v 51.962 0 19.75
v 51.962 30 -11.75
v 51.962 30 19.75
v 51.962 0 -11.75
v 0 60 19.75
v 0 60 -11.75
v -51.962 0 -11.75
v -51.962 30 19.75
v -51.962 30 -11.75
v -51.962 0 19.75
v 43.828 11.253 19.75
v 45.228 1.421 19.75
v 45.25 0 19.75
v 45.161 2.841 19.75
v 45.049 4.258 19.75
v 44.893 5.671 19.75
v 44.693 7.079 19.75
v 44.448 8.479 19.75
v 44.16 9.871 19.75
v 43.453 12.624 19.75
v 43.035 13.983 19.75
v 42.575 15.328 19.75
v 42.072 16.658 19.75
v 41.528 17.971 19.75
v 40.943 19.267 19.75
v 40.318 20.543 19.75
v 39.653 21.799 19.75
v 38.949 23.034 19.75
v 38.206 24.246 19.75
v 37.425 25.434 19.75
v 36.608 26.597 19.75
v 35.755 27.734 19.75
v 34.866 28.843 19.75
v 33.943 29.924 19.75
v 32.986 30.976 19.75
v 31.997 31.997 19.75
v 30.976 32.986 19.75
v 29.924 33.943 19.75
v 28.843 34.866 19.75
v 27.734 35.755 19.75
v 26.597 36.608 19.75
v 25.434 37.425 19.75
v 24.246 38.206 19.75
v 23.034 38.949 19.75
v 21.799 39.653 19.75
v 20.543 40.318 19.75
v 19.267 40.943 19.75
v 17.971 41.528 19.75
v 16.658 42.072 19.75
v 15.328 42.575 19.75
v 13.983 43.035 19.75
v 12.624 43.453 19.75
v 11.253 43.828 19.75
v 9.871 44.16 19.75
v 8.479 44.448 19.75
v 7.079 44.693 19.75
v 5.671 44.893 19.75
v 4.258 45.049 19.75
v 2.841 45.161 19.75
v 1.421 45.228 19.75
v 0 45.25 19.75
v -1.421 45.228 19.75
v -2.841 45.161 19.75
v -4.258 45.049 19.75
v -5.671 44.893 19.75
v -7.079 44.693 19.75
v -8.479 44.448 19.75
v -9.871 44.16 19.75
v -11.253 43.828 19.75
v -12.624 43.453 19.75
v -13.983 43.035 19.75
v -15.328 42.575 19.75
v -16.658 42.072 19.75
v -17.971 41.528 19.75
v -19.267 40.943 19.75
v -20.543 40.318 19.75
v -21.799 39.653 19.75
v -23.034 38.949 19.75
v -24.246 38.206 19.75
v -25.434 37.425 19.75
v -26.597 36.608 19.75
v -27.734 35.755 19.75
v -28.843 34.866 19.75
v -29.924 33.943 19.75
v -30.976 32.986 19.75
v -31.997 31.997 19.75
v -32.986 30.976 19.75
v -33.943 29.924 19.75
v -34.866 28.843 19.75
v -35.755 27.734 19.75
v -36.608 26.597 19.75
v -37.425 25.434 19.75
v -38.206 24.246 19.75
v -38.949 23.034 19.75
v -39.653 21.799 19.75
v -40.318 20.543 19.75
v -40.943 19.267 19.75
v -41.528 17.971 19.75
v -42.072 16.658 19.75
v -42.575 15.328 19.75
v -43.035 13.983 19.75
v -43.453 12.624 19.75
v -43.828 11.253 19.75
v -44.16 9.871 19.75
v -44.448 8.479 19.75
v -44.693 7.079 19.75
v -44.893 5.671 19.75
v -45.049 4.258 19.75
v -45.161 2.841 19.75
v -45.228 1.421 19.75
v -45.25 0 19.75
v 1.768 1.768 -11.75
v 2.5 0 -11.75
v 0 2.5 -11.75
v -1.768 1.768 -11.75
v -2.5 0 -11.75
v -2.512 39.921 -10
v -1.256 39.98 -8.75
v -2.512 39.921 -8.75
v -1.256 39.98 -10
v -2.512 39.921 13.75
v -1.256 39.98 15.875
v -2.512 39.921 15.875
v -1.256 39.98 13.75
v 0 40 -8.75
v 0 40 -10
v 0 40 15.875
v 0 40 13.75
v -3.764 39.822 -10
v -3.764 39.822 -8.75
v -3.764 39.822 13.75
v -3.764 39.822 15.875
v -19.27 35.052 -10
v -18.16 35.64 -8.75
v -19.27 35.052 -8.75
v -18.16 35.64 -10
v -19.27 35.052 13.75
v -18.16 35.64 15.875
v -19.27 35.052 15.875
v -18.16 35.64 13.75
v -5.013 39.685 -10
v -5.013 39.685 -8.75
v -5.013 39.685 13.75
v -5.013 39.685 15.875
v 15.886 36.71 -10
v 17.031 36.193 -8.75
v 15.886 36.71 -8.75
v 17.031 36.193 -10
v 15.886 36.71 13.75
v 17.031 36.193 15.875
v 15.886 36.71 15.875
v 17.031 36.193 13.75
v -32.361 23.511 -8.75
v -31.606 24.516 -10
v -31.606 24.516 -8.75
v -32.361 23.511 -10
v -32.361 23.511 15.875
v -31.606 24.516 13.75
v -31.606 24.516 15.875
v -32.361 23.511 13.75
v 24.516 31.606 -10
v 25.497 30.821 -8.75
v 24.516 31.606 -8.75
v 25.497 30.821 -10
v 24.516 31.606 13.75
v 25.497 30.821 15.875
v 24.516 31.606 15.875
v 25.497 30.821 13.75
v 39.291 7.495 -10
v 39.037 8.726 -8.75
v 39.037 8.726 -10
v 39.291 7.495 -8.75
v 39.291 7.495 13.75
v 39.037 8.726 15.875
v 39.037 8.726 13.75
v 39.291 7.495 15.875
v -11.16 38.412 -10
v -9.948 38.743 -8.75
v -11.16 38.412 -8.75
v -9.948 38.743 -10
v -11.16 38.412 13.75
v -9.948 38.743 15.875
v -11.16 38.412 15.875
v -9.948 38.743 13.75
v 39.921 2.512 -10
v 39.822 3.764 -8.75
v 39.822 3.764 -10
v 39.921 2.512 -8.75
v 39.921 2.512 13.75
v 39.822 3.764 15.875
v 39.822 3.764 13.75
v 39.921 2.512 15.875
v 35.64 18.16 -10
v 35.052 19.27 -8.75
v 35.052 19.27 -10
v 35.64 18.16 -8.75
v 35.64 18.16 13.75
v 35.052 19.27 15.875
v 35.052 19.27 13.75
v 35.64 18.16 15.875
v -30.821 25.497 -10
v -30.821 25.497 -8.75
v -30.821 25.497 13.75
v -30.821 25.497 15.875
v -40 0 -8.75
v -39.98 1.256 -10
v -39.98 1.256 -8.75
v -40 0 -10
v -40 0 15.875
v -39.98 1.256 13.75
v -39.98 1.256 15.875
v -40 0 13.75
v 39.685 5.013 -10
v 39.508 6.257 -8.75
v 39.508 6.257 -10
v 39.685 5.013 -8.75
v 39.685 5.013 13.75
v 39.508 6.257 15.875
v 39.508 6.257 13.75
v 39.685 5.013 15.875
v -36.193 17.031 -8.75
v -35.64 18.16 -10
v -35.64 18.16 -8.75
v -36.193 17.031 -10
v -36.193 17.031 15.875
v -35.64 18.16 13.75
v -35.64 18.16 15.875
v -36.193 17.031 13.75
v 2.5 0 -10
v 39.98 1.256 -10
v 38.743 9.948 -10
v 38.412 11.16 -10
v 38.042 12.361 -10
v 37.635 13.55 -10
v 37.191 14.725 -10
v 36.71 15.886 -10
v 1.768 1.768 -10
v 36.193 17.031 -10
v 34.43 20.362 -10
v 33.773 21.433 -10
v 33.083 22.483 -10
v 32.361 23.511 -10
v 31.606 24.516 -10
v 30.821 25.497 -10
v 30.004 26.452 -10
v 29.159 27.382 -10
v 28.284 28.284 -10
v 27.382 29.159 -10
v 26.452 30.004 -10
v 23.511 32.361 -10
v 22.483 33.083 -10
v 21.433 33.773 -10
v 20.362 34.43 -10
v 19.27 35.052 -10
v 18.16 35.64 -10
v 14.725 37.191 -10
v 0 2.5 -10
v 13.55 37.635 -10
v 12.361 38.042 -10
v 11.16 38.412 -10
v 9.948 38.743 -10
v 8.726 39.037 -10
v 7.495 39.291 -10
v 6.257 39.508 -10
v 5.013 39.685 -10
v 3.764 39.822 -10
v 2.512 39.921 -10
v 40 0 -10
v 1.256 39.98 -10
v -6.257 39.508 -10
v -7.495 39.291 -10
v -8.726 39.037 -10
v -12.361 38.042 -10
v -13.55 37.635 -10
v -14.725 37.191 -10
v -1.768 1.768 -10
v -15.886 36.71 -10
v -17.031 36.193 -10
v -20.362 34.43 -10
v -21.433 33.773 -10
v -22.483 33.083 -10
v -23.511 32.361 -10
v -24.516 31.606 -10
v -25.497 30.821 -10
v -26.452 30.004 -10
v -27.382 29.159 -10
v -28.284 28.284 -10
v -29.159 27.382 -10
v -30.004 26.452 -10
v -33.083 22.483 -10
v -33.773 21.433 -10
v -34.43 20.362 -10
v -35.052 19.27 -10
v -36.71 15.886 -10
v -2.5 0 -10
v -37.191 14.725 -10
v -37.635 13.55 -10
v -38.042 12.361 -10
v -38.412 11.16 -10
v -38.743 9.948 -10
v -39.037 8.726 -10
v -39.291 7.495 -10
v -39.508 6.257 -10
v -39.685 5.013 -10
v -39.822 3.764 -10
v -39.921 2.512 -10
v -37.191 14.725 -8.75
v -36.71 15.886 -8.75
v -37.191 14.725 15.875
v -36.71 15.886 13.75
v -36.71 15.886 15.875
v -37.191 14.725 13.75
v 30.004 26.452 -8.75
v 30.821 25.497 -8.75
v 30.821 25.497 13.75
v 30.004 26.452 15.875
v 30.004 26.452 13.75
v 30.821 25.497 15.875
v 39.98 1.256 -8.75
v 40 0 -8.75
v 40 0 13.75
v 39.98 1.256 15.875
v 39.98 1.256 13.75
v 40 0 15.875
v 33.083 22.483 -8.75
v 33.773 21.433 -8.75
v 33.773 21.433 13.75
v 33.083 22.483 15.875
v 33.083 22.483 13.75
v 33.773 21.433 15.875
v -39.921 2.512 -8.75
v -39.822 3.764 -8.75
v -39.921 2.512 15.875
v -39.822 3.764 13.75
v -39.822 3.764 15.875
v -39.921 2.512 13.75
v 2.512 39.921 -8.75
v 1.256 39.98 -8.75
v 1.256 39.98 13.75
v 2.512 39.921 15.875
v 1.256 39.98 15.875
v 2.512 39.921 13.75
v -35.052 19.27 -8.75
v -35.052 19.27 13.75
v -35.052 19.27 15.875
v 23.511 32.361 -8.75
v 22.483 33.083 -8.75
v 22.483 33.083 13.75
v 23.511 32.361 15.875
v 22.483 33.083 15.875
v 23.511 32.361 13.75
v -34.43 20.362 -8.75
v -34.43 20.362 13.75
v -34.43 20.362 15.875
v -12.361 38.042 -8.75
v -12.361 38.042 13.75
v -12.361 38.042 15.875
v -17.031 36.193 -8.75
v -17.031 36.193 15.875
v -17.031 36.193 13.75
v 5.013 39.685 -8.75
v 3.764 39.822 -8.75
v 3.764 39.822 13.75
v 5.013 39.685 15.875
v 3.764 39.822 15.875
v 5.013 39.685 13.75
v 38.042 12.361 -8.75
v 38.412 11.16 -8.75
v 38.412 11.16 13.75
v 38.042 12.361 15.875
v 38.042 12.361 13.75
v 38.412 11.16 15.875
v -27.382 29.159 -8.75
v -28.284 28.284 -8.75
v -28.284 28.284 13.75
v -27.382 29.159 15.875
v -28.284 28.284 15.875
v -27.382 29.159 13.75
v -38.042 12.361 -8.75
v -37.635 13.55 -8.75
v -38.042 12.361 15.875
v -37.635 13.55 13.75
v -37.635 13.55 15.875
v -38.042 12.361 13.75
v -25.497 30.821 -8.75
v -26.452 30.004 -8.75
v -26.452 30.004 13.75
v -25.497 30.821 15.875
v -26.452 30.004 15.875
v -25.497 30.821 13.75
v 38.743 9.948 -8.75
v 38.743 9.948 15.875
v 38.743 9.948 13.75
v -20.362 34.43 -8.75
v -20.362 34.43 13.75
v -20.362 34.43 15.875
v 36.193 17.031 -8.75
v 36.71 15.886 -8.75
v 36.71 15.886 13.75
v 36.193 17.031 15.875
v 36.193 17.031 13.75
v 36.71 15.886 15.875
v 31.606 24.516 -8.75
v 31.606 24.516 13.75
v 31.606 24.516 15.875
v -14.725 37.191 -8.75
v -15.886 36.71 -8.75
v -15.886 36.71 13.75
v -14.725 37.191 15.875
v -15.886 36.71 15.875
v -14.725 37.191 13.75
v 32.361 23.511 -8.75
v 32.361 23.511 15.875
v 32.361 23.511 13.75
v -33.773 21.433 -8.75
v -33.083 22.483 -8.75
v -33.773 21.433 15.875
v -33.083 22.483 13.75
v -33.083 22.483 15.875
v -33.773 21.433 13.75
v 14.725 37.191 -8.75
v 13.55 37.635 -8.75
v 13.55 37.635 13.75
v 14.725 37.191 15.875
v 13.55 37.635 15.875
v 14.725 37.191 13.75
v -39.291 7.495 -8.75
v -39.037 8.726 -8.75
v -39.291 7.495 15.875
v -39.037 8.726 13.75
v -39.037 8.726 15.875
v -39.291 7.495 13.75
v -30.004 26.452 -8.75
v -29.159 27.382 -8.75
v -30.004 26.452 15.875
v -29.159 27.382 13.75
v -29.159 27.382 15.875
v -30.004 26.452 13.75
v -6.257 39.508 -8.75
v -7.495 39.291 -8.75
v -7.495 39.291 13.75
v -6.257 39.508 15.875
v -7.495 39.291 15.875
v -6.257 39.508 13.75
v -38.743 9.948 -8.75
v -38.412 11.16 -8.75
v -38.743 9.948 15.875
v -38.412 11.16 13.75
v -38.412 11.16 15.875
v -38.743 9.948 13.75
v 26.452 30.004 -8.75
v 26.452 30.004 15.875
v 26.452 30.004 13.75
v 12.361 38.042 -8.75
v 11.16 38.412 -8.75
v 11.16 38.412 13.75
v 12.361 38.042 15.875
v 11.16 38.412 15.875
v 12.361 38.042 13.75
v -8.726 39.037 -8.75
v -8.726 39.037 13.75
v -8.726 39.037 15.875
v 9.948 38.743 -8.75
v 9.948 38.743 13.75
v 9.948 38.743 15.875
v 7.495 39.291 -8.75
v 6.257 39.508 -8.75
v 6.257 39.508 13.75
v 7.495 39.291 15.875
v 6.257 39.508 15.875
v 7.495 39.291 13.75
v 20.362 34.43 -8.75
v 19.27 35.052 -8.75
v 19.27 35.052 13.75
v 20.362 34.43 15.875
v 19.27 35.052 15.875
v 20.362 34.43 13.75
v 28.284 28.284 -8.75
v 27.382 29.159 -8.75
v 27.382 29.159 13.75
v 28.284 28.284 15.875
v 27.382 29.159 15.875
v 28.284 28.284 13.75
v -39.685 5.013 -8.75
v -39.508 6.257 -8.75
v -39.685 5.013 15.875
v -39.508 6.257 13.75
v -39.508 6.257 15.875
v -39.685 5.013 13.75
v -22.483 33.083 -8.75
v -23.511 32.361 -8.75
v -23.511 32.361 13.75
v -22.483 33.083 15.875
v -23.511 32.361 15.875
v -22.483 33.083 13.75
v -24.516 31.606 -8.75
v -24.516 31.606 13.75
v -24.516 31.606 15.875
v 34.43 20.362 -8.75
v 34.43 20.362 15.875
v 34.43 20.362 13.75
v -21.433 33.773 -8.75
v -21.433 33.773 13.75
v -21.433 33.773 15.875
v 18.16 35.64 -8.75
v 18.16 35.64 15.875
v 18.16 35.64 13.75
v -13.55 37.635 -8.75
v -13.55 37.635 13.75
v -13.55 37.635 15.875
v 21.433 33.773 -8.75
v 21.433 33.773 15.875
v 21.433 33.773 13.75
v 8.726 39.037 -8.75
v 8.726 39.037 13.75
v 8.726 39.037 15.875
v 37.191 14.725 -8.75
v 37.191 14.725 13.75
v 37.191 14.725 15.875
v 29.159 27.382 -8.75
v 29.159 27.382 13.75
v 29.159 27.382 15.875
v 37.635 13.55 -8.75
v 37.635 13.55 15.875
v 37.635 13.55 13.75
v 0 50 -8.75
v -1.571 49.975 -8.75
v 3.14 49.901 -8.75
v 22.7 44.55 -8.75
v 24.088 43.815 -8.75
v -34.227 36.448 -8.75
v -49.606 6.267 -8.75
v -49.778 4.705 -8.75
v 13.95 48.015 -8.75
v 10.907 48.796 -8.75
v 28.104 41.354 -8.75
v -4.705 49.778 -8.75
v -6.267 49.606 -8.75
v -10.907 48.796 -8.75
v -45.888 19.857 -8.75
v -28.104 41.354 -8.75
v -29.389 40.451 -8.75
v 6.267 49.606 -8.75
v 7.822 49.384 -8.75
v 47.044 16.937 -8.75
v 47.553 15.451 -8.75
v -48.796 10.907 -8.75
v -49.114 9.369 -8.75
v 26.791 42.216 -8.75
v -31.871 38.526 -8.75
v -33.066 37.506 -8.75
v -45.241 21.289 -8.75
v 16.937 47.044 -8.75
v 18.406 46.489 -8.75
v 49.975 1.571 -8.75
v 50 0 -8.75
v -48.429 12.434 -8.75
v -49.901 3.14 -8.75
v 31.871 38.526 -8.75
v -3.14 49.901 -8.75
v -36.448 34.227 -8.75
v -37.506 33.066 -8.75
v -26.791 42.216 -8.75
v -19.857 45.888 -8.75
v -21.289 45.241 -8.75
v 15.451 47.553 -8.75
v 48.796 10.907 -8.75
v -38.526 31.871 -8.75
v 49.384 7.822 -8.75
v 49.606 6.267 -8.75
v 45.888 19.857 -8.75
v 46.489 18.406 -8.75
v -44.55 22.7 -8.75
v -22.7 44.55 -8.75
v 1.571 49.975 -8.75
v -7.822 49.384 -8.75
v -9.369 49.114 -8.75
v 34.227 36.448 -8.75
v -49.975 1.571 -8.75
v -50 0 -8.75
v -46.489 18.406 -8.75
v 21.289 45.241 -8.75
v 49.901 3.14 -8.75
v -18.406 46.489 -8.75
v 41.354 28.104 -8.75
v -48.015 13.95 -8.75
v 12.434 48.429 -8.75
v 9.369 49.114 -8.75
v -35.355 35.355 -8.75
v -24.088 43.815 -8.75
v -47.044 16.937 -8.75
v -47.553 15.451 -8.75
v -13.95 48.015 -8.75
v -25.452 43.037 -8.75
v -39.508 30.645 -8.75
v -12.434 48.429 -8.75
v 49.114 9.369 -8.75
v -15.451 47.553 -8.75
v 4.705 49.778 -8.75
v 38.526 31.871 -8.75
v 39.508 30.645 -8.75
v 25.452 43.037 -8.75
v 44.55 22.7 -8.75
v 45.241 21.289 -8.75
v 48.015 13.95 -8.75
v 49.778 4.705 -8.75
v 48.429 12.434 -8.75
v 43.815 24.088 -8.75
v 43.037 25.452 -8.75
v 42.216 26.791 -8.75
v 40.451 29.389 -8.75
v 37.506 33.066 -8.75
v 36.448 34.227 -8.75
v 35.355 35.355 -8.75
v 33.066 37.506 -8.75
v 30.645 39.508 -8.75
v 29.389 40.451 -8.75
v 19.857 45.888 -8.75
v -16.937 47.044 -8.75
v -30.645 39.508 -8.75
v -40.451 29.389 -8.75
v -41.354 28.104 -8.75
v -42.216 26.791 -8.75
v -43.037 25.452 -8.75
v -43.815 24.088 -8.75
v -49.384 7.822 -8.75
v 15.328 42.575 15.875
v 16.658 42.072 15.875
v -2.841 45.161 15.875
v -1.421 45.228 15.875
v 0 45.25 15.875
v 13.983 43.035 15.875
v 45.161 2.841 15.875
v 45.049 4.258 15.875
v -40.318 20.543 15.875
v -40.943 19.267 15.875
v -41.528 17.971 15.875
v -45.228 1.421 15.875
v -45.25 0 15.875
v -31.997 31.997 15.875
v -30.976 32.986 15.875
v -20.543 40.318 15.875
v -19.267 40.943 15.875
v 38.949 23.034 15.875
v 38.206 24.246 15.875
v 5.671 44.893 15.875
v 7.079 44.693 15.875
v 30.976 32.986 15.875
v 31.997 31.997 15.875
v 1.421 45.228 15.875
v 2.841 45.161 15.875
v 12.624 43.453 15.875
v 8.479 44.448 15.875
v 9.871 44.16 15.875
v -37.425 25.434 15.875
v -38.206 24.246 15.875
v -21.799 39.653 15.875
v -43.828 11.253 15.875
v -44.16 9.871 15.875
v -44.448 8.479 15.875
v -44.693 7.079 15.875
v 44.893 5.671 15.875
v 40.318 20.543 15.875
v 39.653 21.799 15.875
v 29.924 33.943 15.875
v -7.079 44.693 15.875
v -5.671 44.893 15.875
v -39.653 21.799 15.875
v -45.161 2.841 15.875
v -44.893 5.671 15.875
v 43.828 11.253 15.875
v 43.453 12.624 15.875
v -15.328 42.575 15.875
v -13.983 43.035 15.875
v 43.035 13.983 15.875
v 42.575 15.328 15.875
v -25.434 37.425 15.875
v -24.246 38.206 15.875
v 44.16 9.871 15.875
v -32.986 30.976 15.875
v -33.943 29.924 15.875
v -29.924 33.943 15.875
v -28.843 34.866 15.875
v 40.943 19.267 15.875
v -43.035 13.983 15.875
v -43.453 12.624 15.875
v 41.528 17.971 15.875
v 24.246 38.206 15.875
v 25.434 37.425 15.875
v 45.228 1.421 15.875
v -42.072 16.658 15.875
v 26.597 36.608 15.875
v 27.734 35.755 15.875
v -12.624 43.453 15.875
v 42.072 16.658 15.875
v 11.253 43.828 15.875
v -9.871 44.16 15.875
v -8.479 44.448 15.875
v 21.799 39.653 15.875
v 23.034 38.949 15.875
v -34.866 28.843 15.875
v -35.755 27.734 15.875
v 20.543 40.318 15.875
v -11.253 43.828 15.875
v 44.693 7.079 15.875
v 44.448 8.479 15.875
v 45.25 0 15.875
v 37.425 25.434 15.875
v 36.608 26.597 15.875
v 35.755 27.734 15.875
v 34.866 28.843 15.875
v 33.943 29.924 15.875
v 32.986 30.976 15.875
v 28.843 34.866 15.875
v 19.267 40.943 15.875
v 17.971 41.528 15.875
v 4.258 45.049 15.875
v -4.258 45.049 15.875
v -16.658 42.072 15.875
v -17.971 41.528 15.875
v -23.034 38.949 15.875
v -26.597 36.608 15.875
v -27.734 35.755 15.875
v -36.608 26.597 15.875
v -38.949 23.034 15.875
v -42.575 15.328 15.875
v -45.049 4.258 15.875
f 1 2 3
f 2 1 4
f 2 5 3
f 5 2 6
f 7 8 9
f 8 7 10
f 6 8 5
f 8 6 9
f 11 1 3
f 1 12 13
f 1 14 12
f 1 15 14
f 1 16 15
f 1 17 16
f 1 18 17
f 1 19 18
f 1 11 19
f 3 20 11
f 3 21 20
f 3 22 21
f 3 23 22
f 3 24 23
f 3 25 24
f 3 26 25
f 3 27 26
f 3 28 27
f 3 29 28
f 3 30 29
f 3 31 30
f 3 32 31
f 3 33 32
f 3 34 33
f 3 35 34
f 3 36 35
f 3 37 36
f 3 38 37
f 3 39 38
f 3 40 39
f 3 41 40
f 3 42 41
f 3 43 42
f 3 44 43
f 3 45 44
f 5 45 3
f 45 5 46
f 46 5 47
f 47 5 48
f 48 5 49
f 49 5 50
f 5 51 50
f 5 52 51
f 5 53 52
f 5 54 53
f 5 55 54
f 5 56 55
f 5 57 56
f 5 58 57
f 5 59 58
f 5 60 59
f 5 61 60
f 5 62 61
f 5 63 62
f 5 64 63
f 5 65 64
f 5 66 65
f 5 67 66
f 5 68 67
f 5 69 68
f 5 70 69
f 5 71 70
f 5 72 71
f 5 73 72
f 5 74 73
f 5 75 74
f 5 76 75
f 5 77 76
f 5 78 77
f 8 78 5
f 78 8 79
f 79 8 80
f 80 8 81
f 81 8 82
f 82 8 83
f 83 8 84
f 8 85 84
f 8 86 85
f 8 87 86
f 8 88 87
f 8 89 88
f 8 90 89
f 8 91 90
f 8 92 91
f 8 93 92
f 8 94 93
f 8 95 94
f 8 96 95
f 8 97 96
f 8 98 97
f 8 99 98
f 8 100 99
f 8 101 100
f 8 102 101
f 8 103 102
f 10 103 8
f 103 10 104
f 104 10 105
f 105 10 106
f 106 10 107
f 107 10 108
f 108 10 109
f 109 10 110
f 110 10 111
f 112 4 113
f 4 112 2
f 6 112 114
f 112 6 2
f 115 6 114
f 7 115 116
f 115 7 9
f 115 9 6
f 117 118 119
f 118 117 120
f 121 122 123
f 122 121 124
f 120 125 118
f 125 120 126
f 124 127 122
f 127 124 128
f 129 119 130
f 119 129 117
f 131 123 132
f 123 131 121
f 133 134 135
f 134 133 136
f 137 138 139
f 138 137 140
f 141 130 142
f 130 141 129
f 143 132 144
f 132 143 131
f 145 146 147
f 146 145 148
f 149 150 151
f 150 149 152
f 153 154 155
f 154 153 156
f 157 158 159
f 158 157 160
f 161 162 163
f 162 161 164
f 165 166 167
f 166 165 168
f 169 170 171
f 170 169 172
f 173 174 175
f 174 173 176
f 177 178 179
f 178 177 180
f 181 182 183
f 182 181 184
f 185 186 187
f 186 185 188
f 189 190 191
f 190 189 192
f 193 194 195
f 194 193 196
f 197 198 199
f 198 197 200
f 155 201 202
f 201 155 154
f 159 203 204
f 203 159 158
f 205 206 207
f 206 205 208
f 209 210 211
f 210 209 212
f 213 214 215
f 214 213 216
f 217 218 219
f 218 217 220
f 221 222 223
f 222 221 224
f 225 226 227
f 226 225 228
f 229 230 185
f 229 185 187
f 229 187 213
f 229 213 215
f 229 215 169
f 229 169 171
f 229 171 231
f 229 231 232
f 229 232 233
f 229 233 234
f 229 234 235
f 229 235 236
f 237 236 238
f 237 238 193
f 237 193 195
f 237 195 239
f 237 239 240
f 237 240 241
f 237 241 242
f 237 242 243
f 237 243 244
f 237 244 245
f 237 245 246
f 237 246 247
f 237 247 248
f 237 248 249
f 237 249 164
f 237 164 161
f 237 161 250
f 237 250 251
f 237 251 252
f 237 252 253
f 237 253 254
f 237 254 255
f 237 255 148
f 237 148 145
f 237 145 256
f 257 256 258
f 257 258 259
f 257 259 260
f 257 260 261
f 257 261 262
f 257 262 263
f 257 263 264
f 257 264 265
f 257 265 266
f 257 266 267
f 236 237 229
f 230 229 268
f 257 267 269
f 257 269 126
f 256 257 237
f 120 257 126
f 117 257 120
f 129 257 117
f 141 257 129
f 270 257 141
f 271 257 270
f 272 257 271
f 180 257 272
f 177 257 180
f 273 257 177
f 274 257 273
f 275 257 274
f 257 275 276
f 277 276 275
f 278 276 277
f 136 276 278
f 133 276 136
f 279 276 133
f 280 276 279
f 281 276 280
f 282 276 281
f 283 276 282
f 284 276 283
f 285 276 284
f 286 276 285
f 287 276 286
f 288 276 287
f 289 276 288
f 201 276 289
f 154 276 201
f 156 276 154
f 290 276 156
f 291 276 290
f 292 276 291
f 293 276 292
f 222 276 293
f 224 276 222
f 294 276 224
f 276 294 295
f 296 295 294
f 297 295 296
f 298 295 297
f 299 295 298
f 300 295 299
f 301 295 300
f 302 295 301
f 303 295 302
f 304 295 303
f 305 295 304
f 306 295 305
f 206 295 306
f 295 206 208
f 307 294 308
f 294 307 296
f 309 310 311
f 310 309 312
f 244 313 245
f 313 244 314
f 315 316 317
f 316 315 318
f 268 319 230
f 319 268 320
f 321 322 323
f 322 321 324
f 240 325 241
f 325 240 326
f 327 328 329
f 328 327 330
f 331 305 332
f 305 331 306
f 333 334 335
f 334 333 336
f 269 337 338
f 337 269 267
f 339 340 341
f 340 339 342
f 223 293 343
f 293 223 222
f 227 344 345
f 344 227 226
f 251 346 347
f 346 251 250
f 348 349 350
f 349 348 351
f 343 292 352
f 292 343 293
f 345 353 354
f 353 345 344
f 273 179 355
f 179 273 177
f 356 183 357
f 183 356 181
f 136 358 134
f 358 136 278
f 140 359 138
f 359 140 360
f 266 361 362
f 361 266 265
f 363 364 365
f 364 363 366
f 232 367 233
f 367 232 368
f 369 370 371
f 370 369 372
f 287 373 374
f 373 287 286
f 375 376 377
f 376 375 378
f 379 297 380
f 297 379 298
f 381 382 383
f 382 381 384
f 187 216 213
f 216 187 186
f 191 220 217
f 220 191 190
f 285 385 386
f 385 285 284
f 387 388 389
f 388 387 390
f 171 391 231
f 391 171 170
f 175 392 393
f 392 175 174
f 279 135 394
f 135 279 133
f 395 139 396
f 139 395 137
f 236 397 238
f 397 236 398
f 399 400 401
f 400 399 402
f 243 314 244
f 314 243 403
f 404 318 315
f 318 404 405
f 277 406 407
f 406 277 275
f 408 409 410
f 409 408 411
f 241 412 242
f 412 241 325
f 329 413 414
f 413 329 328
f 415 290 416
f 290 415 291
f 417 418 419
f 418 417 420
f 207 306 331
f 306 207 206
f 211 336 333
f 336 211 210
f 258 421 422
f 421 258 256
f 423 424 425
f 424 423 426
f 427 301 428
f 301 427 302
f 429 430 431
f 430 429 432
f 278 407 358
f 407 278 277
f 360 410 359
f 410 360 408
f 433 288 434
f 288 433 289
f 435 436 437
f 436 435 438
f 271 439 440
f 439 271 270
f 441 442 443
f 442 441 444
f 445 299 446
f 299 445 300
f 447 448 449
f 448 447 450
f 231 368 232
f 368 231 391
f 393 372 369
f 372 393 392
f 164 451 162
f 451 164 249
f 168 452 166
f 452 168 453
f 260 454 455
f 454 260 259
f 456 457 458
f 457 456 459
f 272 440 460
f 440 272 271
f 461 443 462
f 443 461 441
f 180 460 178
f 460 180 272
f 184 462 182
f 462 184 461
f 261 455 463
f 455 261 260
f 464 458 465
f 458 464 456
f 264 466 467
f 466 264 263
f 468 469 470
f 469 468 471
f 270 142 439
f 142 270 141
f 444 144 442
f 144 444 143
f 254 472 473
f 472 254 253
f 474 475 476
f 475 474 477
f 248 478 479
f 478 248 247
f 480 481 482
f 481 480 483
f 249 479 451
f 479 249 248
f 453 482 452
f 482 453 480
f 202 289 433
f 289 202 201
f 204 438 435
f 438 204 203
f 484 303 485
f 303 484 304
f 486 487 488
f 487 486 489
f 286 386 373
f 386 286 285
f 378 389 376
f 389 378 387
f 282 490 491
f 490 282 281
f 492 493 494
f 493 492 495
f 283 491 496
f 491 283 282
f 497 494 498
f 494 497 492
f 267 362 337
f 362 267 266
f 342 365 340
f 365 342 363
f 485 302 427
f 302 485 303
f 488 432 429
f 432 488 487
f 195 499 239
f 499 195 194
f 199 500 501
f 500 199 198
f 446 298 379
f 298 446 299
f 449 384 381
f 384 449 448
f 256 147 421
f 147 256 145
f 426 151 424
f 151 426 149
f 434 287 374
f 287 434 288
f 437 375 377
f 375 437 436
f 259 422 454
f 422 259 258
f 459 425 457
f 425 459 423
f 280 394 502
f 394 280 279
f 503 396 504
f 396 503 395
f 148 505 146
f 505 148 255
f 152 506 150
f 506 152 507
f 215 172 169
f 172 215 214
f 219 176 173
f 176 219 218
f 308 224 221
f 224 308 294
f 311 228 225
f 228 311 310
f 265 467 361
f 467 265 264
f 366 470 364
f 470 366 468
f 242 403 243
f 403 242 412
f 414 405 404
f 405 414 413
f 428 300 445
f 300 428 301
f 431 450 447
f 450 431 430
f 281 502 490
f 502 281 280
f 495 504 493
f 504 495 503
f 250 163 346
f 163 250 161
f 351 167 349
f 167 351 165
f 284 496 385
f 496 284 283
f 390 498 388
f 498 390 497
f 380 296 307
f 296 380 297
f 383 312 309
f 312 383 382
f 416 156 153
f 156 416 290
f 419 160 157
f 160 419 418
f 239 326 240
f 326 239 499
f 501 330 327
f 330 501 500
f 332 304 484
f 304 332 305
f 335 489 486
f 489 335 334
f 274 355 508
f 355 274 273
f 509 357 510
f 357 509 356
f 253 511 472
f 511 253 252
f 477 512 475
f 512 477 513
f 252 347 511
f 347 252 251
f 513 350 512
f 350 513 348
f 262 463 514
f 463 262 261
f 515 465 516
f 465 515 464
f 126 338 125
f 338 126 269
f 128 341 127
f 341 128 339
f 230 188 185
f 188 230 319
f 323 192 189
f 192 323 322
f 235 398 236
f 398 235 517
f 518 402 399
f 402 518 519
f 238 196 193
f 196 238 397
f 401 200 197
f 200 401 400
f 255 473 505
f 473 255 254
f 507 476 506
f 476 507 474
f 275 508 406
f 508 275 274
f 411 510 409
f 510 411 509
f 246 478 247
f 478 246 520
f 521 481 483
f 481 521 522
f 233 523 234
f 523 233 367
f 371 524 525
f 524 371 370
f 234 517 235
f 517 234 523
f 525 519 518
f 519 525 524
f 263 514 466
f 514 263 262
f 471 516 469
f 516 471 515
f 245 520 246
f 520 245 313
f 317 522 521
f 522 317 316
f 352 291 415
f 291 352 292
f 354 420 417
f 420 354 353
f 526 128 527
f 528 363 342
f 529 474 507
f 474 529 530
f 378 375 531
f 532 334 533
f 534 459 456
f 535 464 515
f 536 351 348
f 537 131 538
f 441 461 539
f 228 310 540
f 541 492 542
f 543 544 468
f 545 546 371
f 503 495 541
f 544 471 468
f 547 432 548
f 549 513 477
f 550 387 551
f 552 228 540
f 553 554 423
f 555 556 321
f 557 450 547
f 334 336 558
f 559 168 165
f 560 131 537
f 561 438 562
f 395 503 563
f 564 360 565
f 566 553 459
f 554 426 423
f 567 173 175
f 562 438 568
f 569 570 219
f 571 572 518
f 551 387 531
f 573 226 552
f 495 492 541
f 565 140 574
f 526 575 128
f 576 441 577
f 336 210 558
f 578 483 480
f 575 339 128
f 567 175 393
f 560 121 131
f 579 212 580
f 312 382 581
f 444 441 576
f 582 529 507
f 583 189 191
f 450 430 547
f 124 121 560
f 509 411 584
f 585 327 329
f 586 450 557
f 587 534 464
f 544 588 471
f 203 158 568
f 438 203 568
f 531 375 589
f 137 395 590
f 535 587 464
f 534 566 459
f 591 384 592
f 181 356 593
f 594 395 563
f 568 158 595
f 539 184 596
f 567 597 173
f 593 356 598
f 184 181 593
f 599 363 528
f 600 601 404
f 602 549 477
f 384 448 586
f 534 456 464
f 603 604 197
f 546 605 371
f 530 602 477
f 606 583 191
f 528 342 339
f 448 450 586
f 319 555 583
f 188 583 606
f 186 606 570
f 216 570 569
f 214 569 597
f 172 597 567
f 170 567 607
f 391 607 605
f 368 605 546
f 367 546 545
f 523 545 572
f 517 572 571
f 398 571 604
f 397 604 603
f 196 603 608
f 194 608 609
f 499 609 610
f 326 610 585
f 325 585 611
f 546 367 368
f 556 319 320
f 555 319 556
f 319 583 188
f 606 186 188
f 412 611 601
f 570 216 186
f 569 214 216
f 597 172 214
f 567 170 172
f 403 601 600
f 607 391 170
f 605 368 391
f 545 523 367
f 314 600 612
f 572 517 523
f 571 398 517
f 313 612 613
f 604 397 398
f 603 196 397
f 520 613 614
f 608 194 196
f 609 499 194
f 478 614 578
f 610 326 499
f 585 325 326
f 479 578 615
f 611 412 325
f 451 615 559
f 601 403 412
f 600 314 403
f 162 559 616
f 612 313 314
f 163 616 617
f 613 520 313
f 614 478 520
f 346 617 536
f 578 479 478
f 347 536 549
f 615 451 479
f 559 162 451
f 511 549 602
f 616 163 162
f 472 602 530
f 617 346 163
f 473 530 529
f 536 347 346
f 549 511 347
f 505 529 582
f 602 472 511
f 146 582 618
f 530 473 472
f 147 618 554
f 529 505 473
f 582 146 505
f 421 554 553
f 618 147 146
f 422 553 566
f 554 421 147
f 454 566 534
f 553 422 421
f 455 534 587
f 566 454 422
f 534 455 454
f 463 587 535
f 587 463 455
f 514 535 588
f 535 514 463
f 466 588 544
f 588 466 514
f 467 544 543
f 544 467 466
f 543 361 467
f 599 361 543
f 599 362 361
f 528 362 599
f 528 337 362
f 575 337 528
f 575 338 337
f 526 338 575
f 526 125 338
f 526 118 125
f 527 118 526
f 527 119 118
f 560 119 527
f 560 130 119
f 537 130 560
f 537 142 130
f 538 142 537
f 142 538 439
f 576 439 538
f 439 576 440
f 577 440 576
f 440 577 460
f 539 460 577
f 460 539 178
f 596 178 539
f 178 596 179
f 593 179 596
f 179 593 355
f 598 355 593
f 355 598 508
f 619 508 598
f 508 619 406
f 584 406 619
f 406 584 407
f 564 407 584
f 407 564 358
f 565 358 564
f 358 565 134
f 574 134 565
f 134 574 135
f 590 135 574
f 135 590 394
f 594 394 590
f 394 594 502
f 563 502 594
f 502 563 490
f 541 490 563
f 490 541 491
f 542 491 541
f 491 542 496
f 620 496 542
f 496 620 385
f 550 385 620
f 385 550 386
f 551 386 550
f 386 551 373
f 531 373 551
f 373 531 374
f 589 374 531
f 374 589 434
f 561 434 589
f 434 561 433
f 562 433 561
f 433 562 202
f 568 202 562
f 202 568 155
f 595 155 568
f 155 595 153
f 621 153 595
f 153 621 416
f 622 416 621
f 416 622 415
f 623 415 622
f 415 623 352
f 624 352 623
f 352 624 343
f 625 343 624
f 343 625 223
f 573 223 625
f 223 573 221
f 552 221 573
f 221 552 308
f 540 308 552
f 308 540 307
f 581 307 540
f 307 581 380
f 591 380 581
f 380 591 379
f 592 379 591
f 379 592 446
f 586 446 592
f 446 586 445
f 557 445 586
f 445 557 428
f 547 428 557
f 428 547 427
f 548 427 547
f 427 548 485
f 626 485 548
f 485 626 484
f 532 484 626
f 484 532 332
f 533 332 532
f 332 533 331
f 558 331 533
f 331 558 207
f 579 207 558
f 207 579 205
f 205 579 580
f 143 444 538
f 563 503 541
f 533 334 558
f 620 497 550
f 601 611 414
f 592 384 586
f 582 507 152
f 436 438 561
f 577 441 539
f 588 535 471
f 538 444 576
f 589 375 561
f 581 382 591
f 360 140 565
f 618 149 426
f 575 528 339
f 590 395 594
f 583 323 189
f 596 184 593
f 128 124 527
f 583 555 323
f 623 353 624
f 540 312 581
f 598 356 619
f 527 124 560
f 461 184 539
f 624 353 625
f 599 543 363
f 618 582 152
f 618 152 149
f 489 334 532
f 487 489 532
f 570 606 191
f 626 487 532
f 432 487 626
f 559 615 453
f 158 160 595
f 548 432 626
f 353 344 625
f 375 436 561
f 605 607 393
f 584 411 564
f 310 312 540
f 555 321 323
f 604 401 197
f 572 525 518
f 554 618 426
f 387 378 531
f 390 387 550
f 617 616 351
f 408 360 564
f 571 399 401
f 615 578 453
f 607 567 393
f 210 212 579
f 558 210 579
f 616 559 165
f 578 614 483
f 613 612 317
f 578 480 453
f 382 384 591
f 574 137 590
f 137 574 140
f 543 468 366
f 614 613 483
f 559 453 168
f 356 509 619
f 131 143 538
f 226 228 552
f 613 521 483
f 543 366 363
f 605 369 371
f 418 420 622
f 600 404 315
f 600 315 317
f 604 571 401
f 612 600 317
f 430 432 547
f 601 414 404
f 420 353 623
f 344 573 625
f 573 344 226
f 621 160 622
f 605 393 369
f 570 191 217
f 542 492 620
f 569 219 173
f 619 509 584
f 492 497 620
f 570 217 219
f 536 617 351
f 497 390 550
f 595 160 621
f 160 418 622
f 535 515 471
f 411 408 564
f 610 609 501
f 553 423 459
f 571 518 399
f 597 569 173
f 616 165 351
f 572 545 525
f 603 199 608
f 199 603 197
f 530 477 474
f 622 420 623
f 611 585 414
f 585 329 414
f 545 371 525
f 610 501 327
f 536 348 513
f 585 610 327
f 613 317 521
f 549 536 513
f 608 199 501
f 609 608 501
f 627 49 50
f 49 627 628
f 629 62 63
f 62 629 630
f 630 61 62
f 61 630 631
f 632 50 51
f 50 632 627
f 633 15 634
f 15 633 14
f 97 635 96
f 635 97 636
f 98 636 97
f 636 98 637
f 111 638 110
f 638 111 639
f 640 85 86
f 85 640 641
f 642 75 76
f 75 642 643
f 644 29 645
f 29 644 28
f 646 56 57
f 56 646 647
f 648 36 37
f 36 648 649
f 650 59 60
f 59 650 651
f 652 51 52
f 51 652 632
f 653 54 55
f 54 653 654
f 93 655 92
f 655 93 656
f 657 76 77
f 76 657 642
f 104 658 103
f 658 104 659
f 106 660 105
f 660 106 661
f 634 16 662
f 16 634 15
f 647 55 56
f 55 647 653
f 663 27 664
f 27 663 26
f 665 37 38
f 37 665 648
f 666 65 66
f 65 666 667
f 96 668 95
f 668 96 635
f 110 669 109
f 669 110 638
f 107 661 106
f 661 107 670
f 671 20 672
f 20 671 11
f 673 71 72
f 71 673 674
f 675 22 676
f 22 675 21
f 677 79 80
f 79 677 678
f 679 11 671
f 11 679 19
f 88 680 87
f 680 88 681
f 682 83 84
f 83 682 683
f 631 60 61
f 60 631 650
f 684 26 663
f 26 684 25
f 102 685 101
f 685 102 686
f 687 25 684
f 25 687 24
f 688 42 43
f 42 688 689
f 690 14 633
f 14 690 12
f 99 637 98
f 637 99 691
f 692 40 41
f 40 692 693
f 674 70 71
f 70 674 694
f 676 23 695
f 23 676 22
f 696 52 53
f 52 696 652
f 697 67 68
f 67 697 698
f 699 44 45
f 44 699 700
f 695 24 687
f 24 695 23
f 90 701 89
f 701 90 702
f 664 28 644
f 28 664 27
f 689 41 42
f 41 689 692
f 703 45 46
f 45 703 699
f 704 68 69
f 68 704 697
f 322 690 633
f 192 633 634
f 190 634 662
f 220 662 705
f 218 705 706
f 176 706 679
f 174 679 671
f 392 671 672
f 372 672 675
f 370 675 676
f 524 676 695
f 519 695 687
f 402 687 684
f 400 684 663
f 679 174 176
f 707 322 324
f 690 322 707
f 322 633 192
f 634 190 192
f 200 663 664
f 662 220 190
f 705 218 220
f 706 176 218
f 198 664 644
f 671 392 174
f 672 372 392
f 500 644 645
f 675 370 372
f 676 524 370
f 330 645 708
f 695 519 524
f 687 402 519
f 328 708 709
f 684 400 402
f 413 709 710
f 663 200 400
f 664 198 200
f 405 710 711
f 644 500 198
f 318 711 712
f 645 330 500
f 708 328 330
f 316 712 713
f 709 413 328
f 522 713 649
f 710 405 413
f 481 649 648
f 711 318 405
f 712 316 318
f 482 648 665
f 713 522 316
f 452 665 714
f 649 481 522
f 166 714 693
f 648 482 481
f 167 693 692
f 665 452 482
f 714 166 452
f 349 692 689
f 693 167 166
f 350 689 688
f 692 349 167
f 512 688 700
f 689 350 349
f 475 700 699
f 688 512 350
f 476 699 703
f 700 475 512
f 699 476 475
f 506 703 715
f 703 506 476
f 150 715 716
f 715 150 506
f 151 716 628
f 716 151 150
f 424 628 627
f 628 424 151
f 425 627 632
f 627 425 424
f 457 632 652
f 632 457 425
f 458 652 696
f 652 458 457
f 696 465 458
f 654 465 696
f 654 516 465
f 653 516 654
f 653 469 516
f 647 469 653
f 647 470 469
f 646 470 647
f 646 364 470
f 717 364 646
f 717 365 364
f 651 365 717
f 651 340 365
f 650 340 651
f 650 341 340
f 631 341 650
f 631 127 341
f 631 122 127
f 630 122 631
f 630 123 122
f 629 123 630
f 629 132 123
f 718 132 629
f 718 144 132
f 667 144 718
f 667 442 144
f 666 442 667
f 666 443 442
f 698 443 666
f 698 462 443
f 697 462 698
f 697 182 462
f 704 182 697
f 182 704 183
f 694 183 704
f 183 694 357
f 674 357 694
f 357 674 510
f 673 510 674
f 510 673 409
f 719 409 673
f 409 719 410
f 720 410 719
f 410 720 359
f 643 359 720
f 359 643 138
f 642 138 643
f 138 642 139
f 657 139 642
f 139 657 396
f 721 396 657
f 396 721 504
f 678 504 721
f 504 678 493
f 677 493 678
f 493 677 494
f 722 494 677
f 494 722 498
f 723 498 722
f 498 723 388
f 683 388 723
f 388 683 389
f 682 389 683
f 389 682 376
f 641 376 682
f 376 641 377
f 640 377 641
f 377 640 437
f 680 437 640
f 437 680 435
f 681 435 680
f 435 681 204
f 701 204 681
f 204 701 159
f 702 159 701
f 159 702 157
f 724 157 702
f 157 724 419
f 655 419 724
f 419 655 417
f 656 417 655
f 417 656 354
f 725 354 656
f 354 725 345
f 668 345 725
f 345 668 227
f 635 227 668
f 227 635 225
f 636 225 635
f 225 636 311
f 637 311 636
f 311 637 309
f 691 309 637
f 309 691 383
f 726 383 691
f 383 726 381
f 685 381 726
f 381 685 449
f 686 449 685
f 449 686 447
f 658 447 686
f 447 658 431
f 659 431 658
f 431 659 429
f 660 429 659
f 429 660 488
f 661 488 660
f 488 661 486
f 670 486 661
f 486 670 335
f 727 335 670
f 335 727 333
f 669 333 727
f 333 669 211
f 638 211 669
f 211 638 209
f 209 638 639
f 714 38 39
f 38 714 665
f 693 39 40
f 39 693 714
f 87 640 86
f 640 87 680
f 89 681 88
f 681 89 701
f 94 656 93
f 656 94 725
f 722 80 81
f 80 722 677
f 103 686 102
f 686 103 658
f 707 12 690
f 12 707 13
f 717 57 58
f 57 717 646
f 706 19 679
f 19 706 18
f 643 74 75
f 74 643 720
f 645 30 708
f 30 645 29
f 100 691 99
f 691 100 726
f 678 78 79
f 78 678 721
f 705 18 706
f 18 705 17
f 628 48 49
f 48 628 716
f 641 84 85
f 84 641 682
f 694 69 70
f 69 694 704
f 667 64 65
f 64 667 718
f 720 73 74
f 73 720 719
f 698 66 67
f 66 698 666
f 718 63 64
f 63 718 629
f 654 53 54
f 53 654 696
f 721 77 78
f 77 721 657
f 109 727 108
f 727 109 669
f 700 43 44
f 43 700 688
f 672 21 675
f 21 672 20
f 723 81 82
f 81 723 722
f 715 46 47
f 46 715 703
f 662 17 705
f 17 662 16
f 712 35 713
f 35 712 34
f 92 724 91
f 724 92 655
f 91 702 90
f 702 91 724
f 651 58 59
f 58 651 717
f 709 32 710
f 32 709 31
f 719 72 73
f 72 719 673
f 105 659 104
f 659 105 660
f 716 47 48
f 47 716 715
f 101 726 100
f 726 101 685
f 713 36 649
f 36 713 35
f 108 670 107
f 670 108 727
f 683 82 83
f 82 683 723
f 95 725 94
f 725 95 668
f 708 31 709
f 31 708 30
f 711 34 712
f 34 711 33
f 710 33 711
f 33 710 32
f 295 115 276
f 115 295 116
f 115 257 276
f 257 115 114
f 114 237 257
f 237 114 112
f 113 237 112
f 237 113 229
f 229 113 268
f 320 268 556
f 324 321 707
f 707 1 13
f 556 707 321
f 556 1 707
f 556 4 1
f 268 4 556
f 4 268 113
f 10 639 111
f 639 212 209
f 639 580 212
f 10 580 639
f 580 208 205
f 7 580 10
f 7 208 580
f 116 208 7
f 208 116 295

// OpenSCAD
d=0.25;

r_screw=2.5;

wall=2.5;
acrylic=4;

h_tube=25;
r_out=60; 
r_in=40;
r_acrylic=45;

intersection(){
    rotate([0,0,90]) box();
    translate([-500,0,-500]) cube([1000, 1000,1000]);
}

module box(){
    difference(){
        translate([0, 0, acrylic]) cylinder(h=h_tube+acrylic+wall, r=r_out, center=true, $fn=6);
        
        translate([0,0,h_tube/2+wall]) cylinder(h=h_tube*2, r=r_in, center=true, $fn=200);
        translate([0,0,wall]) cylinder(h=h_tube-wall, r1=r_in+(r_out-r_in)/2, r2=r_in, center=true, $fn=200);
        
        //Acrylic
        translate([0,0, h_tube/2+wall/2+acrylic+d]) cylinder(h=acrylic+d, r=r_acrylic+d, center=true, $fn=200);
        
        #cylinder(h=h_tube*2, r=r_screw, center=true);
    }
}
